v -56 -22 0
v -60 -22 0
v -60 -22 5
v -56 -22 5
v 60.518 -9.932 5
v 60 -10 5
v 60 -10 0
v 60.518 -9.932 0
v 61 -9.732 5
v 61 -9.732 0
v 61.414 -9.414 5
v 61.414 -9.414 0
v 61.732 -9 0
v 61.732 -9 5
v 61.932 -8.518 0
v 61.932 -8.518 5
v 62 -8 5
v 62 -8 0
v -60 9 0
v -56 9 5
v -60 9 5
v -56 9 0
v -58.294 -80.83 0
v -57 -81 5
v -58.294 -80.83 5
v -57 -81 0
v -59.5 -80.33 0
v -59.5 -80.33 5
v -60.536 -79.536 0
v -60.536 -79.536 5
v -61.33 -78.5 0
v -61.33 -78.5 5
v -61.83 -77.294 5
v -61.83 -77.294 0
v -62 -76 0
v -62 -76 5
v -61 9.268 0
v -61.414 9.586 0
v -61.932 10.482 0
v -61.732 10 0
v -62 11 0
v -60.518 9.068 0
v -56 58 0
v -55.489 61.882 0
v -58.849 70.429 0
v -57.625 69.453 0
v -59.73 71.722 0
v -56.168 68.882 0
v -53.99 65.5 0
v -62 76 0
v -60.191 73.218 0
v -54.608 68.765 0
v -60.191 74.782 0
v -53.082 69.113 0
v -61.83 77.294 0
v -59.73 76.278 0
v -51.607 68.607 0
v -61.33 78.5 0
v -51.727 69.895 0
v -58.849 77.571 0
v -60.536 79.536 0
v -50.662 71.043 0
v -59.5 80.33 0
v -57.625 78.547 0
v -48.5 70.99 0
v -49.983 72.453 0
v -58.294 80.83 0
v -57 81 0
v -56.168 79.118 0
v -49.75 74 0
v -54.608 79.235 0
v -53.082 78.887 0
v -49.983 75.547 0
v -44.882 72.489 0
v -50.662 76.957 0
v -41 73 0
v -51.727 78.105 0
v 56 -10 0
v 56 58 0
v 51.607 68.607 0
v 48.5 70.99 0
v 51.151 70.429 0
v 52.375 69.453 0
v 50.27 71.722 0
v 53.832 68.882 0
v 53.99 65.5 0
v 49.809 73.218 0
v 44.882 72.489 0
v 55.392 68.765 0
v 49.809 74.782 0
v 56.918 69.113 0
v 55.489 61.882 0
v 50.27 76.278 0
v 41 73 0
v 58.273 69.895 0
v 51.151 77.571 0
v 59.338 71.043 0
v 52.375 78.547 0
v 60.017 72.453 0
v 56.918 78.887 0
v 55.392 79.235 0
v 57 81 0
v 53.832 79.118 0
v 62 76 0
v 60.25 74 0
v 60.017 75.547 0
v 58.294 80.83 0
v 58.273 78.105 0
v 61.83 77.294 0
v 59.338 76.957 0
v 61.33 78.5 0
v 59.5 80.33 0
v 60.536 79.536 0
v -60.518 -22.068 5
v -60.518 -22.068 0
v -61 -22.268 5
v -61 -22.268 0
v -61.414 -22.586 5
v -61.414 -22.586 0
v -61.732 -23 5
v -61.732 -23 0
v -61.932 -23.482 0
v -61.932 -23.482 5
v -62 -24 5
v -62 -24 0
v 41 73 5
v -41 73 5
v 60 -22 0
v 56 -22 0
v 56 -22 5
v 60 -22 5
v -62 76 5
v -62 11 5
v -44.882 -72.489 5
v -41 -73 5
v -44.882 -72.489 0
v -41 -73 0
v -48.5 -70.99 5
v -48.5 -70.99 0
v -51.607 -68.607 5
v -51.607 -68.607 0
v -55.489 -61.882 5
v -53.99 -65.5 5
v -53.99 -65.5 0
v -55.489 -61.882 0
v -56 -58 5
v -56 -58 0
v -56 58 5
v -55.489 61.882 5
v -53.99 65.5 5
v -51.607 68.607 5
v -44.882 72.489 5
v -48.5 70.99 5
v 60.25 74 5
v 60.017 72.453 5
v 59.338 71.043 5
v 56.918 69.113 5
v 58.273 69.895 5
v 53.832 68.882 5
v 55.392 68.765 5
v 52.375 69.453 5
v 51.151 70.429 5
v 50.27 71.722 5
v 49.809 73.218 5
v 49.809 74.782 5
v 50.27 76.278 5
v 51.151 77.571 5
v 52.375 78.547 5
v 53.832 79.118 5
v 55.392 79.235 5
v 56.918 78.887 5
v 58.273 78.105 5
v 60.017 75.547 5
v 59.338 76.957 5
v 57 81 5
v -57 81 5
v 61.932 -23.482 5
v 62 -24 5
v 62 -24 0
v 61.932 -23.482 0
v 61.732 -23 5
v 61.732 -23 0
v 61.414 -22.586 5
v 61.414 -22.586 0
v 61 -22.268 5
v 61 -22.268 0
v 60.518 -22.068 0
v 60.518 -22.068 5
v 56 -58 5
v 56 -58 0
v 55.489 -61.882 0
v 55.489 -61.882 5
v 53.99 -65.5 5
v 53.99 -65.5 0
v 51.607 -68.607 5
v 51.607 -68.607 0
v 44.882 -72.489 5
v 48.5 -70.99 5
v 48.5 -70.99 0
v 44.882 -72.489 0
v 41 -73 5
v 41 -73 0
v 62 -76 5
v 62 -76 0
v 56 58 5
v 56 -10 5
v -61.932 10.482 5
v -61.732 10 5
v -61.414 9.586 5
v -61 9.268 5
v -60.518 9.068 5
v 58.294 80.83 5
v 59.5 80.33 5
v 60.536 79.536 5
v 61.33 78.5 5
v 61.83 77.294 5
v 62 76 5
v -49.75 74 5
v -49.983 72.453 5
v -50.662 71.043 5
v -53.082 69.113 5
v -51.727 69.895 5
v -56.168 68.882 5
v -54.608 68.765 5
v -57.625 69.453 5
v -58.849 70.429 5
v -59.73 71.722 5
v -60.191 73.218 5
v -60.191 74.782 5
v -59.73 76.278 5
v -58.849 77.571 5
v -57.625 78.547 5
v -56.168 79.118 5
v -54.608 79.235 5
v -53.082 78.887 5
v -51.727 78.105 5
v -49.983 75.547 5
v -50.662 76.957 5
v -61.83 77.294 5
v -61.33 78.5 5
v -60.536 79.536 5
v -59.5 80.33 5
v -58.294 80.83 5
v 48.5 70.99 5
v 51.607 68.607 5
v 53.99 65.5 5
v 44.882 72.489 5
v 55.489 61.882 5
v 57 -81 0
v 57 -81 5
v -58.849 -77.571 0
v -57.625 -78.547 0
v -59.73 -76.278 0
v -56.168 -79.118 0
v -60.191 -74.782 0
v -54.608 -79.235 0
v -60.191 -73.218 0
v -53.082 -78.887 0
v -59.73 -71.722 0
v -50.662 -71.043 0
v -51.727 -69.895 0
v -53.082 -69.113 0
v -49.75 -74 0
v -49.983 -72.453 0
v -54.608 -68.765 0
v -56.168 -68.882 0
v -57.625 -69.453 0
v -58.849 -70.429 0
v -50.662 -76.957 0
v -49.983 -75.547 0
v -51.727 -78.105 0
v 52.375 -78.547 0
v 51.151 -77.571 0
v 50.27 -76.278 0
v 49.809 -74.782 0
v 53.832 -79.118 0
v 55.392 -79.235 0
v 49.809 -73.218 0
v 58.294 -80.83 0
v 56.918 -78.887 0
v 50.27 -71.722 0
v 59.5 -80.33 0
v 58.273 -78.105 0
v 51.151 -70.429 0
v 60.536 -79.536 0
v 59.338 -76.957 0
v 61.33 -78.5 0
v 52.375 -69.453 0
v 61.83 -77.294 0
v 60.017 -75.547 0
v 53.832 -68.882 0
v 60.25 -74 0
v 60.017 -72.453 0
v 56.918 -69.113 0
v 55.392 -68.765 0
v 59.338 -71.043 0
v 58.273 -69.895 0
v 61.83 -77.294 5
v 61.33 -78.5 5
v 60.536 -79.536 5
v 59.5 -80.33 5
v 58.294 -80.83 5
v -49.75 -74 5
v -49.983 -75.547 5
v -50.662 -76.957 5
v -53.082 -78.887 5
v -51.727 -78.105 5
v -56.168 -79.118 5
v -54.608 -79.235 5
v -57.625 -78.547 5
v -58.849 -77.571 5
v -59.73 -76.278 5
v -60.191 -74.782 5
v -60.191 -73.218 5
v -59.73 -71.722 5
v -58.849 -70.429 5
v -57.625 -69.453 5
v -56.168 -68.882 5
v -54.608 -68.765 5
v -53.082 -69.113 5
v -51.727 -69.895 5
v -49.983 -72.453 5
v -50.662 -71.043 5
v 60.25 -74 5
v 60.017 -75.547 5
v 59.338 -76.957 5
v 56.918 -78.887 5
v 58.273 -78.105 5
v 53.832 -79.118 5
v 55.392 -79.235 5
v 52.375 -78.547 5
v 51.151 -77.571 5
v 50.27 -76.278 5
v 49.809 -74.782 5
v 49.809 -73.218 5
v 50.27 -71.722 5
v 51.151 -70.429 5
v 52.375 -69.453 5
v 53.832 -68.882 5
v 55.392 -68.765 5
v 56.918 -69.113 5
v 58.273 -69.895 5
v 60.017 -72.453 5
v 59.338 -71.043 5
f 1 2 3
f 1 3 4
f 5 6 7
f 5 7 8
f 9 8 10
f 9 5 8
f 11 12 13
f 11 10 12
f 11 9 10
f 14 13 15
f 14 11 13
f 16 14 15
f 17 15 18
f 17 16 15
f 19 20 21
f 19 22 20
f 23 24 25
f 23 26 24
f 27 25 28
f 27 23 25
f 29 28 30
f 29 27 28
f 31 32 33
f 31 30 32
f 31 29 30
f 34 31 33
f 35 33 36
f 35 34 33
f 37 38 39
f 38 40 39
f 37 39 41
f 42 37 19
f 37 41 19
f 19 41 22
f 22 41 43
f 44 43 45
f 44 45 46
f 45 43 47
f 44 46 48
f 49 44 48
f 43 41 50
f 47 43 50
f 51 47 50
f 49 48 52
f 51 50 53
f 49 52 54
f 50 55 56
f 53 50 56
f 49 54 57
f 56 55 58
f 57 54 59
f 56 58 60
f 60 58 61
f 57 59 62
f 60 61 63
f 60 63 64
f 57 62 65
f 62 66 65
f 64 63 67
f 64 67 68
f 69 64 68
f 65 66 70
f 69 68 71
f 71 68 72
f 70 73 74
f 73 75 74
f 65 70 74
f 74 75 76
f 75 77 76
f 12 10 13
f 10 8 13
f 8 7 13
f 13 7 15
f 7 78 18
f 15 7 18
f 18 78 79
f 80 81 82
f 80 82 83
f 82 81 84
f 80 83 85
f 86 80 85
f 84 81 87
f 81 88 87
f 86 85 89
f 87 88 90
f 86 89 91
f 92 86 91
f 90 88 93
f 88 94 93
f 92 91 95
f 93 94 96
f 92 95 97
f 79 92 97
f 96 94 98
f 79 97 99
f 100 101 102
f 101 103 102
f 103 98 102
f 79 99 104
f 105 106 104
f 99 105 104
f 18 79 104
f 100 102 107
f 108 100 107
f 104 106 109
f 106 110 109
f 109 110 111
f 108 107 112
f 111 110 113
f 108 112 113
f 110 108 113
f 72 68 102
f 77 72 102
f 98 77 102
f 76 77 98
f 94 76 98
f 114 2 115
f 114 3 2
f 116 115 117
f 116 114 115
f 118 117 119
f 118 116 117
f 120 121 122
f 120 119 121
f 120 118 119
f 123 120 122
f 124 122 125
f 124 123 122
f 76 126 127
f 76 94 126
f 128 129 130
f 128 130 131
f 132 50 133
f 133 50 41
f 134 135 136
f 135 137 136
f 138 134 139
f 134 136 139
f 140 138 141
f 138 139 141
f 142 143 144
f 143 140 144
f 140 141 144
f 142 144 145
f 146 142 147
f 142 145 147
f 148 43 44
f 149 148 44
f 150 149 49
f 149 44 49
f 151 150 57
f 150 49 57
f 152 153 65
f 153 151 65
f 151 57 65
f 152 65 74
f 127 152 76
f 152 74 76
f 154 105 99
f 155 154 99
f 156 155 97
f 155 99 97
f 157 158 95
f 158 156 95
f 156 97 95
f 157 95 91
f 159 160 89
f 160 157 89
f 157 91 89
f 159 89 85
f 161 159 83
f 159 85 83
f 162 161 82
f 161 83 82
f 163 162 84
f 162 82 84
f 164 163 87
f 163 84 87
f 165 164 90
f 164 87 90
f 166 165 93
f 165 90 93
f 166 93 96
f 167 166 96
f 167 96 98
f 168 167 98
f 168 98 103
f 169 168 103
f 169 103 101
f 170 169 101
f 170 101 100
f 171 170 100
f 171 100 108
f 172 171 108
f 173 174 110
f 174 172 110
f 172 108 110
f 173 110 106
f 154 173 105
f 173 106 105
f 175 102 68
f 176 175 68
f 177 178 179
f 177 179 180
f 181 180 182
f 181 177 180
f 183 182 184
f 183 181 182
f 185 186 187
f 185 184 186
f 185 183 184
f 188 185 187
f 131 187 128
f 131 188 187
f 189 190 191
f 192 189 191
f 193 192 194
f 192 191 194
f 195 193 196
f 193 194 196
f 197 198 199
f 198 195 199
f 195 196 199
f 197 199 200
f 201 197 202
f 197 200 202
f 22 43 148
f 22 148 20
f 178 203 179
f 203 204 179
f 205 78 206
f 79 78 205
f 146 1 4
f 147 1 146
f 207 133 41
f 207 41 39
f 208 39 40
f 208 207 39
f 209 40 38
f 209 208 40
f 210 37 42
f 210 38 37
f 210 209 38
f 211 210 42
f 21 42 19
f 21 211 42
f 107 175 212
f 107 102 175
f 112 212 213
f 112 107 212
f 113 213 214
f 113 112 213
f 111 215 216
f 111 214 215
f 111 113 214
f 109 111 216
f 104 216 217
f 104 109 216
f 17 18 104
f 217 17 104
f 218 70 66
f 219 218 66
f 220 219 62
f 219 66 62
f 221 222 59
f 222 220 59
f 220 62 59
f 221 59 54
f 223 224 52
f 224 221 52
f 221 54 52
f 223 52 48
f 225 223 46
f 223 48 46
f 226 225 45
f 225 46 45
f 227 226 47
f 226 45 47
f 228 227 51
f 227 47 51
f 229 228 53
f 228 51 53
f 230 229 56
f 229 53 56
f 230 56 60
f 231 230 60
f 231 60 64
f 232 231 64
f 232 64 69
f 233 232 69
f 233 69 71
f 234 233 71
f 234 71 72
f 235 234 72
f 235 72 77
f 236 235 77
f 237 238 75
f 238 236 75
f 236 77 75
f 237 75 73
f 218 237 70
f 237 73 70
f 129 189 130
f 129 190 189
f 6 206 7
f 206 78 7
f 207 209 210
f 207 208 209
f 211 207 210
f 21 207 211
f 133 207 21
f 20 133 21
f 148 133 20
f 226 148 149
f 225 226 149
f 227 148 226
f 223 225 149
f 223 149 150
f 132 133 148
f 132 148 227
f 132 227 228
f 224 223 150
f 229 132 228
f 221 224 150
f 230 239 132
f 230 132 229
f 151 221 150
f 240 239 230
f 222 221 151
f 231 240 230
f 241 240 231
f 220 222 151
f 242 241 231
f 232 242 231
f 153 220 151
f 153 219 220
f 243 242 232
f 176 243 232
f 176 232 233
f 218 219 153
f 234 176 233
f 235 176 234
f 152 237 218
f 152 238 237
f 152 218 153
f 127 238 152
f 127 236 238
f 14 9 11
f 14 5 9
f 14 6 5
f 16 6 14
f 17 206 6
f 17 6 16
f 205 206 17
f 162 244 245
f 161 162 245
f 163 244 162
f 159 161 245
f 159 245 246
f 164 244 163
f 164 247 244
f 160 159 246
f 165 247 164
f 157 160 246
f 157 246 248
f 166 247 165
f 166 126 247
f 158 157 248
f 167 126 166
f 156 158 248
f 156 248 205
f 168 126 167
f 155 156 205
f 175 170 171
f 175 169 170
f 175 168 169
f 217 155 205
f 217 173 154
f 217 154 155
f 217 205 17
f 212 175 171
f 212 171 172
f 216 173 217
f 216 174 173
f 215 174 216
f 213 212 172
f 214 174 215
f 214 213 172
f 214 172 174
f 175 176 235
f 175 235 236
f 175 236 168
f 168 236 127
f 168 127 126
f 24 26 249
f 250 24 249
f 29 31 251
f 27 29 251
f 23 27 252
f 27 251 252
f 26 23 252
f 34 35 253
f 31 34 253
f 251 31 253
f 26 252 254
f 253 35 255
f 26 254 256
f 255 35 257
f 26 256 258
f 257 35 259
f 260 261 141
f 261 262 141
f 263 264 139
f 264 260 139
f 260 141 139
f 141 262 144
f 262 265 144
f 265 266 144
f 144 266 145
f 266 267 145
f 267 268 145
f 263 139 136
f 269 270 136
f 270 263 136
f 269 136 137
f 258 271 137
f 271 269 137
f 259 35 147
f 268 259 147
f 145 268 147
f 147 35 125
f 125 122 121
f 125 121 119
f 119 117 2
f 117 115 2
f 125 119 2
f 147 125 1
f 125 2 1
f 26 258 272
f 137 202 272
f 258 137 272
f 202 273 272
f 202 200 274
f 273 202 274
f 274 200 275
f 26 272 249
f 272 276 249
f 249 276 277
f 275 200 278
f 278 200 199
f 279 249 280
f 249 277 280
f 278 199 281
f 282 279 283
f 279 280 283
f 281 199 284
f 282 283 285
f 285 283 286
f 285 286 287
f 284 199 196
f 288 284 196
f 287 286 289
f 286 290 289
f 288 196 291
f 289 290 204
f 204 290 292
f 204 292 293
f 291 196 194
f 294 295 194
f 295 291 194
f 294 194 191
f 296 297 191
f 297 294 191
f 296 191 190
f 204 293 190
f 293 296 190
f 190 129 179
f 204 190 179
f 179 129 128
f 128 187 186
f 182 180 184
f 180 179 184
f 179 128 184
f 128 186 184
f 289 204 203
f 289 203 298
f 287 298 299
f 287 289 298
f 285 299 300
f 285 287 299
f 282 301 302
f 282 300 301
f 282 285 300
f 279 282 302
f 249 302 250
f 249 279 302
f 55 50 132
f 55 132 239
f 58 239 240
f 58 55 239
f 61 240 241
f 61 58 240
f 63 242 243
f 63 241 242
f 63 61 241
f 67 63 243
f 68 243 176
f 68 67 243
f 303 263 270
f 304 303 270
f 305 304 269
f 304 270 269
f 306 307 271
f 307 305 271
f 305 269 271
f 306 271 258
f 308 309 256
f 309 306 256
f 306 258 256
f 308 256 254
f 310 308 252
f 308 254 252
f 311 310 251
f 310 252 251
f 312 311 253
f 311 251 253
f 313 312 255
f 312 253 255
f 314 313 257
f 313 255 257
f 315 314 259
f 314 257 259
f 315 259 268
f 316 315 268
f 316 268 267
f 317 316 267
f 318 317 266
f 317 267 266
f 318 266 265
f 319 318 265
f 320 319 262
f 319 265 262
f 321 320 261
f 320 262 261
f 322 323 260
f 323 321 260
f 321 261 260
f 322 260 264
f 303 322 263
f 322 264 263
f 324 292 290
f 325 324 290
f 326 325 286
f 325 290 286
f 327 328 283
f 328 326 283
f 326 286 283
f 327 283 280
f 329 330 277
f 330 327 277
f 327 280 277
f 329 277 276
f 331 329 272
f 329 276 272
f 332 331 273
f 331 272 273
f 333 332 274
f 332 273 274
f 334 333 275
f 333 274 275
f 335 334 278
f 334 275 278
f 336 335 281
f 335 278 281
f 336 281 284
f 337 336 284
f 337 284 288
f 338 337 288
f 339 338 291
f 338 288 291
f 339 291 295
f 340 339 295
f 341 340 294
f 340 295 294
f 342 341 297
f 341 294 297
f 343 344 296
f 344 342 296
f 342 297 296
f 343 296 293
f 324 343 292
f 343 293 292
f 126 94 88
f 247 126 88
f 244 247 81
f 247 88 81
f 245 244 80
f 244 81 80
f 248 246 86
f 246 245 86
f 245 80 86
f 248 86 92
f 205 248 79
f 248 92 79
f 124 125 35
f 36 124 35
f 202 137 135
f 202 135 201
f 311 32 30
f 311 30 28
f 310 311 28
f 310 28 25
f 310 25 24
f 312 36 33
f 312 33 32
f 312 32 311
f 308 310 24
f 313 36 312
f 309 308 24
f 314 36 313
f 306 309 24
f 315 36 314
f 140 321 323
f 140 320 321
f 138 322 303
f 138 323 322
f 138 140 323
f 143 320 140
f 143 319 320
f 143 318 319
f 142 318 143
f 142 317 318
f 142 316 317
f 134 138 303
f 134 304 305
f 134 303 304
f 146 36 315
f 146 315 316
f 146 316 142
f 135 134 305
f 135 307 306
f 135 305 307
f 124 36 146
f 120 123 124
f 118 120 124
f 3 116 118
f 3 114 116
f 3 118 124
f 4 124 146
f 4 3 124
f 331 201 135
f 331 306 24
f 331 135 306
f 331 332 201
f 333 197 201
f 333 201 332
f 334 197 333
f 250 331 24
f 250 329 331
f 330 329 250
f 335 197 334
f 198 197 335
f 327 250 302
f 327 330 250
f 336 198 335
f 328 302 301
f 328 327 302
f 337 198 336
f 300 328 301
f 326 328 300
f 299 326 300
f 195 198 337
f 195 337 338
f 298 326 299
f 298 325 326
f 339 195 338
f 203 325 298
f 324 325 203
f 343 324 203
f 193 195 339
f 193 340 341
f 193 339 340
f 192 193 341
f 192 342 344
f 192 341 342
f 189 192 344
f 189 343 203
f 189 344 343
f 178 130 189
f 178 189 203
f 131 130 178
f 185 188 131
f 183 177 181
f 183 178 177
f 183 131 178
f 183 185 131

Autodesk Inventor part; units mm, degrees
ref_plane "YZ Plane" through (0, 0, 0) normal (1, 0, 0) x (0, 1, 0)
ref_plane "XZ Plane" through (0, 0, 0) normal (0, 1, 0) x (-1, 0, 0)
ref_plane "XY Plane" through (0, 0, 0) normal (0, 0, 1) x (1, 0, 0)
sketch "Sketch1" plane through (0, 0, 0) normal (0, 0, 1) x (1, 0, 0)
  line L0 (-57, -81) -> (57, -81)
  line L1 (62, -76) -> (62, -22)
  line L2 (57, 81) -> (-57, 81)
  line L3 (-62, 76) -> (-62, 9)
  line L4 (-41, -73) -> (41, -73)
  line L5 (56, -58) -> (56, -22)
  line L6 (41, 73) -> (-41, 73)
  line L7 (-56, 58) -> (-56, 9)
  arc A0 (-56, -58) -> (-41, -73) centre (-41, -58) ccw
  arc A1 (-41, 73) -> (-56, 58) centre (-41, 58) ccw
  arc A2 (56, 58) -> (41, 73) centre (41, 58) ccw
  arc A3 (41, -73) -> (56, -58) centre (41, -58) ccw
  line L8 (56, -22) -> (62, -22)
  line L9 (56, -10) -> (62, -10)
  line L10 (-56, 9) -> (-62, 9)
  line L11 (-62, -22) -> (-56, -22)
  line L12 (-62, -22) -> (-62, -76)
  line L13 (-62, 9) -> (-62, -22) construction
  line L14 (-56, -22) -> (-56, -58)
  line L15 (-56, 9) -> (-56, -22) construction
  line L16 (56, -22) -> (56, -10) construction
  line L17 (56, -10) -> (56, 58)
  line L18 (62, -22) -> (62, -10) construction
  line L19 (62, -10) -> (62, 76)
  arc A4 (-62, -76) -> (-57, -81) centre (-57, -76) ccw
  arc A5 (-57, 81) -> (-62, 76) centre (-57, 76) ccw
  arc A6 (62, 76) -> (57, 81) centre (57, 76) ccw
  arc A7 (57, -81) -> (62, -76) centre (57, -76) ccw
  circle A8 centre (-55, -74) radius 5.25
  line L20 (-92.4325, 0) -> (79.0499, 0) construction
  line L21 (0, -100.3717) -> (0, 120.689) construction
  circle A9 centre (-55, 74) radius 5.25
  circle A10 centre (55, -74) radius 5.25
  circle A11 centre (55, 74) radius 5.25
  point P0 (0, 0)
  point P1 (-62, -81)
  point P2 (62, 81)
  point P3 (-62, 81)
  dimension "d0" = 162
  dimension "d1" = 124
  dimension "d2" = 62
  dimension "d3" = 81
  dimension "d4" = 6
  dimension "d5" = 8
  dimension "d6" = 6
  dimension "d7" = 8
  dimension "d8" = 15
  dimension "d9" = 12
  dimension "d10" = 59
  dimension "d11" = 59
  dimension "d12" = 72
  dimension "d13" = 5
  dimension "d14" = 7
  dimension "d15" = 7
  dimension "d16" = 10.5
extrude "Extrusion1" add sketch "Sketch1" along normal blind 5
fillet "Fillet1" radius 2 4 edges at (62, -22, 2.5) (62, -10, 2.5) (-62, 9, 2.5) (-62, -22, 2.5)
properties part number "Plex_Rand_untere2" material "PET Plastic"
